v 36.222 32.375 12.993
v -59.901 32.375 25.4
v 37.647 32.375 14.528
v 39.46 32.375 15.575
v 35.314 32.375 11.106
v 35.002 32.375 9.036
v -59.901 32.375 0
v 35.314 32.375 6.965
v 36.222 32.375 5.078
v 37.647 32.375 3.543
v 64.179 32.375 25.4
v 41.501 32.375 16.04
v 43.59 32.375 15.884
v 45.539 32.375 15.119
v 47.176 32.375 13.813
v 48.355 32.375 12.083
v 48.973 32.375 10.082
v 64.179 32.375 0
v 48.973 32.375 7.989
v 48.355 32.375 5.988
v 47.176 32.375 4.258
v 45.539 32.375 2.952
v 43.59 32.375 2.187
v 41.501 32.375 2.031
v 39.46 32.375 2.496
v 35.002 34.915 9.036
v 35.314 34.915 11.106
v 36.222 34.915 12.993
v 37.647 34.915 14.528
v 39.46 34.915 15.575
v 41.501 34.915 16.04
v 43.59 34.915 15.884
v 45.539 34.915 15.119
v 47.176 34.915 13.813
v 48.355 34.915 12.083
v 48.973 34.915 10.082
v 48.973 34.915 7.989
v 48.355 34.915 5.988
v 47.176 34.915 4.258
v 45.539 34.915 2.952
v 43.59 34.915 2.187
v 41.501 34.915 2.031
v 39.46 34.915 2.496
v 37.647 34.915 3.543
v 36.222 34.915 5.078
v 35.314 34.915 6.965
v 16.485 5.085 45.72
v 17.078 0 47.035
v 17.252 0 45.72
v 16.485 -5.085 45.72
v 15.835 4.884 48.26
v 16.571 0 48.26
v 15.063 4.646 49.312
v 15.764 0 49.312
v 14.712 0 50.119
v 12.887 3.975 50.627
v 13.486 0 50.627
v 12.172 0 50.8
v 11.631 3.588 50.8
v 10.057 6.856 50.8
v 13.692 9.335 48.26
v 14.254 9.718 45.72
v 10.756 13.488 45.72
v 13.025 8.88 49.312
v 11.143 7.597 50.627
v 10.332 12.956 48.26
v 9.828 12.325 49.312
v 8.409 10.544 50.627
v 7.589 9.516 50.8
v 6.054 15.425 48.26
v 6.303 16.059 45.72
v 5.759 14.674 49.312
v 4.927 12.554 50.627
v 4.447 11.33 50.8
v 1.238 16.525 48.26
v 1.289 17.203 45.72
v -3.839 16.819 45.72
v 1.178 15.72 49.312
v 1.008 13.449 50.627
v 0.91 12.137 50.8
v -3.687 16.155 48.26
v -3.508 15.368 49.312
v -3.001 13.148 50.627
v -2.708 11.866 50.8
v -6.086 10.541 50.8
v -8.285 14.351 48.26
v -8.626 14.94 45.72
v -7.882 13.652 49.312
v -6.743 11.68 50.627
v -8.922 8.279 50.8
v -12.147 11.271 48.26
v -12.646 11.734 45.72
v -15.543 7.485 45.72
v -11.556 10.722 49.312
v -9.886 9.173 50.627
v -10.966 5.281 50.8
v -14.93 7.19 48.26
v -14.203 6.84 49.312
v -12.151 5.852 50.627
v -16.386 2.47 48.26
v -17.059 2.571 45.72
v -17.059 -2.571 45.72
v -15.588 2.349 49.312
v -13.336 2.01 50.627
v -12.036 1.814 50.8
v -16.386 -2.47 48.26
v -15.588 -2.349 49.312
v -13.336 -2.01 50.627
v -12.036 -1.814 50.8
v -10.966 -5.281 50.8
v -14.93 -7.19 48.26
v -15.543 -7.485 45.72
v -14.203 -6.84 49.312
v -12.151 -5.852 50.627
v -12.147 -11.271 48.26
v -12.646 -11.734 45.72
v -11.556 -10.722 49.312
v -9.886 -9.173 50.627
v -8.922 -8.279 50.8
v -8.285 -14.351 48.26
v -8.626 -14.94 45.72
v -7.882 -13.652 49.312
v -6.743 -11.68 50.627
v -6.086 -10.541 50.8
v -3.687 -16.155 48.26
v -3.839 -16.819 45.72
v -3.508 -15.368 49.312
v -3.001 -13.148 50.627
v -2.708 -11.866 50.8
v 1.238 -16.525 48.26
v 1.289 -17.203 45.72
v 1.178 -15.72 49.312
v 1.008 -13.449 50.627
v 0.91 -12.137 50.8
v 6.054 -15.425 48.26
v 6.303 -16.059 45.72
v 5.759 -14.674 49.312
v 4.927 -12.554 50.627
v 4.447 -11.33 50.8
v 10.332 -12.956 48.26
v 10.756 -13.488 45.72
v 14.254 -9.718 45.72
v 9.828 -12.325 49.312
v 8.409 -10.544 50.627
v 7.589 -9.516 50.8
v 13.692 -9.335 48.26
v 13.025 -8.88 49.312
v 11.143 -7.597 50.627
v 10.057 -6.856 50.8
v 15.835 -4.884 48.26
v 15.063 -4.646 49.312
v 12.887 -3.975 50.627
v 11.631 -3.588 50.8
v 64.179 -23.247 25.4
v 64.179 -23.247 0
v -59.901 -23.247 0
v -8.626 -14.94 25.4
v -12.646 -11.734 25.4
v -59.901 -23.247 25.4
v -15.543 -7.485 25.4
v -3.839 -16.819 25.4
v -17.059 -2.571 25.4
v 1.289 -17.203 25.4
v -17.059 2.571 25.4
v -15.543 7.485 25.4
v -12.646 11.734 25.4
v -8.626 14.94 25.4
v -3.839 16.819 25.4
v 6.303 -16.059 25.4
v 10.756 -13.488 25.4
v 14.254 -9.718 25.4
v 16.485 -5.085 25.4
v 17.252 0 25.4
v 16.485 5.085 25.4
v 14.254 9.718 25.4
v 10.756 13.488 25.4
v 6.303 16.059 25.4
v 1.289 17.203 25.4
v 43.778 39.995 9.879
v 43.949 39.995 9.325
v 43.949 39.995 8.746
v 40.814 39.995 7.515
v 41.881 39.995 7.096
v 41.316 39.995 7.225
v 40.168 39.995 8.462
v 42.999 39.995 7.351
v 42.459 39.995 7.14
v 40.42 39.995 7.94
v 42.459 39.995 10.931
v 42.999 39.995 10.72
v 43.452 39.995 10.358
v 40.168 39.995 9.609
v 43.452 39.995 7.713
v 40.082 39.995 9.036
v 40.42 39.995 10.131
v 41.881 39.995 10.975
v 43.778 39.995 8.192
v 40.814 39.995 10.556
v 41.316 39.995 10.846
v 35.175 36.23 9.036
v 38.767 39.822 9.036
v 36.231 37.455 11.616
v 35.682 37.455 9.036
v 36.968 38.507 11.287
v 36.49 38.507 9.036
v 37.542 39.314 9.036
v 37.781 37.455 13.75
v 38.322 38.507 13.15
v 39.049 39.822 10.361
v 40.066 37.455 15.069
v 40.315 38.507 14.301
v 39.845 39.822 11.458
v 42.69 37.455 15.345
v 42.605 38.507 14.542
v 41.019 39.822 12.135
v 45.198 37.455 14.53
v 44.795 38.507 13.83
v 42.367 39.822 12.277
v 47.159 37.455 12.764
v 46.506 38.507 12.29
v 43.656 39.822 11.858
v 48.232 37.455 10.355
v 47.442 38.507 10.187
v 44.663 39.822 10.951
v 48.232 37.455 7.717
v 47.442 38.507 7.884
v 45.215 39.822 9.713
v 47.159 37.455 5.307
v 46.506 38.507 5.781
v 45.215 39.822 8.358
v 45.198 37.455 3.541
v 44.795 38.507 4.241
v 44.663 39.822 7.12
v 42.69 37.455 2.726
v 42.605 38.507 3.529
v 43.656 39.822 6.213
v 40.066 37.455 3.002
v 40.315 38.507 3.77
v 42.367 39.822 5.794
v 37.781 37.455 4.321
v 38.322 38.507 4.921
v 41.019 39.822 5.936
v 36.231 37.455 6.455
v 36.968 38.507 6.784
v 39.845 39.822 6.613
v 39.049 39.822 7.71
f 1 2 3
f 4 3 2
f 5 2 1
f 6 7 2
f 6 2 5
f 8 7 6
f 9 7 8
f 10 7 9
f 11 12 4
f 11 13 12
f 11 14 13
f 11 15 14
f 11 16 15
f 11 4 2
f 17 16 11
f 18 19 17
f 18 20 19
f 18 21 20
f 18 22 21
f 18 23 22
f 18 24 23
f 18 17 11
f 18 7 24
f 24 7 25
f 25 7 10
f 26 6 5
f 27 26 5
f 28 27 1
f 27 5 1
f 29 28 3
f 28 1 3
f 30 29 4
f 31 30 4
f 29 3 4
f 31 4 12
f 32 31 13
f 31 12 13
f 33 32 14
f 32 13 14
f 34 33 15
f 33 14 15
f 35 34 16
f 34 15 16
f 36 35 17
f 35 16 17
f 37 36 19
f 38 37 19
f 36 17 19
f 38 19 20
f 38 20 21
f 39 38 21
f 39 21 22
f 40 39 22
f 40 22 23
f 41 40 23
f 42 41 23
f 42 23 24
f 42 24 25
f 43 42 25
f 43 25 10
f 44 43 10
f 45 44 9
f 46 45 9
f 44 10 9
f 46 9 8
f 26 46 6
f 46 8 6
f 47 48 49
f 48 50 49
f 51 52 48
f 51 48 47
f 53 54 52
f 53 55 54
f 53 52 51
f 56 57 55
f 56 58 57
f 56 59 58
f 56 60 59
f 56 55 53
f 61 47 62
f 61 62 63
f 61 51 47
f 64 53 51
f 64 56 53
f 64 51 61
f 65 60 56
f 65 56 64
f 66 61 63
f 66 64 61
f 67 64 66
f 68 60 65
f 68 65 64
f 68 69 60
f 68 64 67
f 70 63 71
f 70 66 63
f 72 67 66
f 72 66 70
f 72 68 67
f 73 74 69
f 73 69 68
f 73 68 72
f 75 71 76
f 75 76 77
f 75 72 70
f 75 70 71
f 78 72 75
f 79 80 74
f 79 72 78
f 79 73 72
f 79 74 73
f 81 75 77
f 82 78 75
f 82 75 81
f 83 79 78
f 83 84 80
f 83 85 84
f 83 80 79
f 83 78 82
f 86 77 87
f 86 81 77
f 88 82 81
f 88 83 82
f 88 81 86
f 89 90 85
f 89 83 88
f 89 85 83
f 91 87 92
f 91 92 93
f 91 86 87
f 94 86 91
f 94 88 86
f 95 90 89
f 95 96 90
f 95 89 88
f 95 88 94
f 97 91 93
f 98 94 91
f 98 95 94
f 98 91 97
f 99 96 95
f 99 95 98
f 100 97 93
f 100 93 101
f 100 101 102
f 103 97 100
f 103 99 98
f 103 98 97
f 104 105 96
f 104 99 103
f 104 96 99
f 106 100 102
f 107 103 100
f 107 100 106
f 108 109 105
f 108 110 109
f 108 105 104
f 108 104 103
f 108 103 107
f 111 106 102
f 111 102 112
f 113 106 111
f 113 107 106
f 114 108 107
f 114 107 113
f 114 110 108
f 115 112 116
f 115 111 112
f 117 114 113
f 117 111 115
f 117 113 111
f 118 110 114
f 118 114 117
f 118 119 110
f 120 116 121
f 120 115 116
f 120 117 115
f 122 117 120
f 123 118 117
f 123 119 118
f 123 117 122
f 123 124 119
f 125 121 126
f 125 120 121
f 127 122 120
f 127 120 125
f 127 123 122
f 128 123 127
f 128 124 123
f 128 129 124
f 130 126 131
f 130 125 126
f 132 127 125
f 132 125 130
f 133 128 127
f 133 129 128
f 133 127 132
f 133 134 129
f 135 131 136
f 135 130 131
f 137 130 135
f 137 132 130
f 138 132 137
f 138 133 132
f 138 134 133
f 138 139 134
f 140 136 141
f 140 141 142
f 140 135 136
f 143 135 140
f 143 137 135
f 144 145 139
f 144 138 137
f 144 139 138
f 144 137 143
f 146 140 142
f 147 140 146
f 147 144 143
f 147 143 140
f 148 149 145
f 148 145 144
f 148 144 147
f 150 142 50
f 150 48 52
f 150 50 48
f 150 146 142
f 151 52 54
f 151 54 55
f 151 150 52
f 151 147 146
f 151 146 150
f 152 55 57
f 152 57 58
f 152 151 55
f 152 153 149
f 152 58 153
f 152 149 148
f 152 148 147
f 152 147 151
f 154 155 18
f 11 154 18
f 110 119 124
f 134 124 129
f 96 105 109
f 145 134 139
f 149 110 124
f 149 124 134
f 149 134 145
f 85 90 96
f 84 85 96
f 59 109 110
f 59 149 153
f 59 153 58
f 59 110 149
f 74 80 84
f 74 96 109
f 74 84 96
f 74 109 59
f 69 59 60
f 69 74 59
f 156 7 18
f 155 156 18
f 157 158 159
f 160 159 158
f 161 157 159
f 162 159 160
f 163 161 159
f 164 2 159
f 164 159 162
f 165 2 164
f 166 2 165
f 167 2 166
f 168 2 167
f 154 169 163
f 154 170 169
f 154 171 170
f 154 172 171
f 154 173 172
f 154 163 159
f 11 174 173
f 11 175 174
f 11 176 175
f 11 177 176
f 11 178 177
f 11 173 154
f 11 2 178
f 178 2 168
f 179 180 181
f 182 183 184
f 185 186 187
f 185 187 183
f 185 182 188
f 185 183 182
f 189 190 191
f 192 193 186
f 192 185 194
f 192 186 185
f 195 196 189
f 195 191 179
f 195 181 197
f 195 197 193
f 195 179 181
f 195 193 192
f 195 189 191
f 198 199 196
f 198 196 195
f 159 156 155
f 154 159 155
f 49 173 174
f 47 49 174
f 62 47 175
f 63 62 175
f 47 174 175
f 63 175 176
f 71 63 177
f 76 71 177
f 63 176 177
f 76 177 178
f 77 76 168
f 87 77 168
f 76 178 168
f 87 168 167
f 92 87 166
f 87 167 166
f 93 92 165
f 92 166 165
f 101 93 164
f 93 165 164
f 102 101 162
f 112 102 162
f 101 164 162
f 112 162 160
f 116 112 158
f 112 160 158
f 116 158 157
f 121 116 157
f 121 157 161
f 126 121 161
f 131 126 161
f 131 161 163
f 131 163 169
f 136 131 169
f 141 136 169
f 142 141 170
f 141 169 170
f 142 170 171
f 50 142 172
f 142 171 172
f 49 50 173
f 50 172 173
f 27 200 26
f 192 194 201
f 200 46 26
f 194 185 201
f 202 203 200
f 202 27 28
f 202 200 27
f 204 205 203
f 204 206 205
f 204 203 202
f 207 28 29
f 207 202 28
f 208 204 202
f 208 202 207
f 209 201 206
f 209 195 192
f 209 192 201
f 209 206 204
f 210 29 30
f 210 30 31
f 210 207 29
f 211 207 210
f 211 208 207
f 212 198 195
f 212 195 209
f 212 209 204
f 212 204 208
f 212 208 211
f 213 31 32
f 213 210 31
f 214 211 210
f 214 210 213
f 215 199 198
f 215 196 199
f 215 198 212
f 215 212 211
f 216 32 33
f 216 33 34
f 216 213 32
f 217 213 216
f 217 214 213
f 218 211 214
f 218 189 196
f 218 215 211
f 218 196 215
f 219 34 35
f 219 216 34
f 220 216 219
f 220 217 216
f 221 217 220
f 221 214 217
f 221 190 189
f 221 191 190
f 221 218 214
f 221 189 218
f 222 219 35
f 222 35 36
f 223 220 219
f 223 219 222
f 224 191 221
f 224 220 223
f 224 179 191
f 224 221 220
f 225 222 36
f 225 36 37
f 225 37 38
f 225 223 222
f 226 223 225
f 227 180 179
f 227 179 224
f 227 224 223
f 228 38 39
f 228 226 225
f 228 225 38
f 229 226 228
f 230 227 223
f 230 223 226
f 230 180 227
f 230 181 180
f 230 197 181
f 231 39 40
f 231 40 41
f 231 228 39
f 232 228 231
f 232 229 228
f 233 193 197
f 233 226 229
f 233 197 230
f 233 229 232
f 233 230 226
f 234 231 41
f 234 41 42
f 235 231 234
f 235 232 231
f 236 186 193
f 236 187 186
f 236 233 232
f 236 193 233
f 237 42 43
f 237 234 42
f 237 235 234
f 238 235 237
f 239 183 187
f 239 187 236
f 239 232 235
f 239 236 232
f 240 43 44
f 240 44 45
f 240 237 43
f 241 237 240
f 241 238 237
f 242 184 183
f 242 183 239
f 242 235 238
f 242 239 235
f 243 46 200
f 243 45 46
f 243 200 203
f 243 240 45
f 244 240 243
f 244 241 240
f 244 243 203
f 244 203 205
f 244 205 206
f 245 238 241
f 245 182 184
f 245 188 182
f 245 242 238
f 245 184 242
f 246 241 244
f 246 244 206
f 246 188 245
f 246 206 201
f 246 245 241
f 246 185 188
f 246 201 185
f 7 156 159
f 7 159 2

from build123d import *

# Parameters (mm, degrees)
F0_W     = 124.079682
F0_H     = 55.621927
F1_DEPTH = 25.4
F2_R     = 17.251533
F3_DEPTH = 25.4
F4_R     = 5.08
F5_R     = 7.02462
F6_DEPTH = 7.62
F7_R     = 5.08


with BuildPart() as f1:
    # F0 (on Top) → F1 (new body)
    with BuildSketch(Plane.XY):
        with Locations((2.139304, 4.563851)):
            Rectangle(F0_W, F0_H)
    extrude(amount=F1_DEPTH)

    # F2 (on face) → F3 (join)
    with BuildSketch(Plane.XY.offset(25.4)):
        Circle(F2_R)
    extrude(amount=F3_DEPTH)

    # F4
    f4_edges = [f1.edges().sort_by_distance(p)[0] for p in [
        (-17.251533, 0, 50.8),
    ]]
    fillet(f4_edges, radius=F4_R)

    # F5 (on face) → F6 (join)
    with BuildSketch(Plane(origin=(0, 32.374814, 0), x_dir=(-1, 0, 0), z_dir=(0, 1, 0))):
        with Locations((-42.026419, 9.035506)):
            Circle(F5_R)
    extrude(amount=F6_DEPTH)

    # F7
    f7_edges = [f1.edges().sort_by_distance(p)[0] for p in [
        (49.051039, 39.994814, 9.035506),
    ]]
    fillet(f7_edges, radius=F7_R)


solid = f1.part
